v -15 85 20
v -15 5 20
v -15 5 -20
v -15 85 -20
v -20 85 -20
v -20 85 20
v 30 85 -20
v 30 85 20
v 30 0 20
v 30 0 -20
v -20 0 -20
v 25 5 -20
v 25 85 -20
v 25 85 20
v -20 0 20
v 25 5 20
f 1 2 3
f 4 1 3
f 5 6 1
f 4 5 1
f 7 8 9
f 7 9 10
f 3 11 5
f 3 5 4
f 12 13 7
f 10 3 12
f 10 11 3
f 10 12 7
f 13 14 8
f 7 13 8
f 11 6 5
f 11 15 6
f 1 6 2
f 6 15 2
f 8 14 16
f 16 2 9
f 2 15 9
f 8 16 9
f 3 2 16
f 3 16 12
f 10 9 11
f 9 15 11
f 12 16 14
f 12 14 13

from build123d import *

# Parameters (mm, degrees)
SKETCH2_W           = 40
SKETCH2_H           = 40
BOSS_EXTRUDE1_DEPTH = 5
SKETCH3_W           = 40
SKETCH3_H           = 5
BOSS_EXTRUDE2_DEPTH = 10
SKETCH4_W           = 5
SKETCH4_H           = 40
BOSS_EXTRUDE3_DEPTH = 80


with BuildPart() as part:
    # Sketch2 → Boss-Extrude1 (new body)
    with BuildSketch(Plane(origin=(0, 0, 0), x_dir=(1, 0, 0), z_dir=(0, 1, 0))):
        Rectangle(SKETCH2_W, SKETCH2_H)
    extrude(amount=BOSS_EXTRUDE1_DEPTH)

    # Sketch3 → Boss-Extrude2 (add)
    with BuildSketch(Plane(origin=(20, 0, 0), x_dir=(0, 0, -1), z_dir=(1, 0, 0))):
        with Locations((0, 2.5)):
            Rectangle(SKETCH3_W, SKETCH3_H)
    extrude(amount=BOSS_EXTRUDE2_DEPTH)

    # Sketch4 → Boss-Extrude3 (add)
    with BuildSketch(Plane(origin=(0, 5, 0), x_dir=(1, 0, 0), z_dir=(0, 1, 0))):
        with Locations((-17.5, 0)):
            Rectangle(SKETCH4_W, SKETCH4_H)
        with Locations((27.5, 0)):
            Rectangle(SKETCH4_W, SKETCH4_H)
    extrude(amount=BOSS_EXTRUDE3_DEPTH)


solid = part.part
